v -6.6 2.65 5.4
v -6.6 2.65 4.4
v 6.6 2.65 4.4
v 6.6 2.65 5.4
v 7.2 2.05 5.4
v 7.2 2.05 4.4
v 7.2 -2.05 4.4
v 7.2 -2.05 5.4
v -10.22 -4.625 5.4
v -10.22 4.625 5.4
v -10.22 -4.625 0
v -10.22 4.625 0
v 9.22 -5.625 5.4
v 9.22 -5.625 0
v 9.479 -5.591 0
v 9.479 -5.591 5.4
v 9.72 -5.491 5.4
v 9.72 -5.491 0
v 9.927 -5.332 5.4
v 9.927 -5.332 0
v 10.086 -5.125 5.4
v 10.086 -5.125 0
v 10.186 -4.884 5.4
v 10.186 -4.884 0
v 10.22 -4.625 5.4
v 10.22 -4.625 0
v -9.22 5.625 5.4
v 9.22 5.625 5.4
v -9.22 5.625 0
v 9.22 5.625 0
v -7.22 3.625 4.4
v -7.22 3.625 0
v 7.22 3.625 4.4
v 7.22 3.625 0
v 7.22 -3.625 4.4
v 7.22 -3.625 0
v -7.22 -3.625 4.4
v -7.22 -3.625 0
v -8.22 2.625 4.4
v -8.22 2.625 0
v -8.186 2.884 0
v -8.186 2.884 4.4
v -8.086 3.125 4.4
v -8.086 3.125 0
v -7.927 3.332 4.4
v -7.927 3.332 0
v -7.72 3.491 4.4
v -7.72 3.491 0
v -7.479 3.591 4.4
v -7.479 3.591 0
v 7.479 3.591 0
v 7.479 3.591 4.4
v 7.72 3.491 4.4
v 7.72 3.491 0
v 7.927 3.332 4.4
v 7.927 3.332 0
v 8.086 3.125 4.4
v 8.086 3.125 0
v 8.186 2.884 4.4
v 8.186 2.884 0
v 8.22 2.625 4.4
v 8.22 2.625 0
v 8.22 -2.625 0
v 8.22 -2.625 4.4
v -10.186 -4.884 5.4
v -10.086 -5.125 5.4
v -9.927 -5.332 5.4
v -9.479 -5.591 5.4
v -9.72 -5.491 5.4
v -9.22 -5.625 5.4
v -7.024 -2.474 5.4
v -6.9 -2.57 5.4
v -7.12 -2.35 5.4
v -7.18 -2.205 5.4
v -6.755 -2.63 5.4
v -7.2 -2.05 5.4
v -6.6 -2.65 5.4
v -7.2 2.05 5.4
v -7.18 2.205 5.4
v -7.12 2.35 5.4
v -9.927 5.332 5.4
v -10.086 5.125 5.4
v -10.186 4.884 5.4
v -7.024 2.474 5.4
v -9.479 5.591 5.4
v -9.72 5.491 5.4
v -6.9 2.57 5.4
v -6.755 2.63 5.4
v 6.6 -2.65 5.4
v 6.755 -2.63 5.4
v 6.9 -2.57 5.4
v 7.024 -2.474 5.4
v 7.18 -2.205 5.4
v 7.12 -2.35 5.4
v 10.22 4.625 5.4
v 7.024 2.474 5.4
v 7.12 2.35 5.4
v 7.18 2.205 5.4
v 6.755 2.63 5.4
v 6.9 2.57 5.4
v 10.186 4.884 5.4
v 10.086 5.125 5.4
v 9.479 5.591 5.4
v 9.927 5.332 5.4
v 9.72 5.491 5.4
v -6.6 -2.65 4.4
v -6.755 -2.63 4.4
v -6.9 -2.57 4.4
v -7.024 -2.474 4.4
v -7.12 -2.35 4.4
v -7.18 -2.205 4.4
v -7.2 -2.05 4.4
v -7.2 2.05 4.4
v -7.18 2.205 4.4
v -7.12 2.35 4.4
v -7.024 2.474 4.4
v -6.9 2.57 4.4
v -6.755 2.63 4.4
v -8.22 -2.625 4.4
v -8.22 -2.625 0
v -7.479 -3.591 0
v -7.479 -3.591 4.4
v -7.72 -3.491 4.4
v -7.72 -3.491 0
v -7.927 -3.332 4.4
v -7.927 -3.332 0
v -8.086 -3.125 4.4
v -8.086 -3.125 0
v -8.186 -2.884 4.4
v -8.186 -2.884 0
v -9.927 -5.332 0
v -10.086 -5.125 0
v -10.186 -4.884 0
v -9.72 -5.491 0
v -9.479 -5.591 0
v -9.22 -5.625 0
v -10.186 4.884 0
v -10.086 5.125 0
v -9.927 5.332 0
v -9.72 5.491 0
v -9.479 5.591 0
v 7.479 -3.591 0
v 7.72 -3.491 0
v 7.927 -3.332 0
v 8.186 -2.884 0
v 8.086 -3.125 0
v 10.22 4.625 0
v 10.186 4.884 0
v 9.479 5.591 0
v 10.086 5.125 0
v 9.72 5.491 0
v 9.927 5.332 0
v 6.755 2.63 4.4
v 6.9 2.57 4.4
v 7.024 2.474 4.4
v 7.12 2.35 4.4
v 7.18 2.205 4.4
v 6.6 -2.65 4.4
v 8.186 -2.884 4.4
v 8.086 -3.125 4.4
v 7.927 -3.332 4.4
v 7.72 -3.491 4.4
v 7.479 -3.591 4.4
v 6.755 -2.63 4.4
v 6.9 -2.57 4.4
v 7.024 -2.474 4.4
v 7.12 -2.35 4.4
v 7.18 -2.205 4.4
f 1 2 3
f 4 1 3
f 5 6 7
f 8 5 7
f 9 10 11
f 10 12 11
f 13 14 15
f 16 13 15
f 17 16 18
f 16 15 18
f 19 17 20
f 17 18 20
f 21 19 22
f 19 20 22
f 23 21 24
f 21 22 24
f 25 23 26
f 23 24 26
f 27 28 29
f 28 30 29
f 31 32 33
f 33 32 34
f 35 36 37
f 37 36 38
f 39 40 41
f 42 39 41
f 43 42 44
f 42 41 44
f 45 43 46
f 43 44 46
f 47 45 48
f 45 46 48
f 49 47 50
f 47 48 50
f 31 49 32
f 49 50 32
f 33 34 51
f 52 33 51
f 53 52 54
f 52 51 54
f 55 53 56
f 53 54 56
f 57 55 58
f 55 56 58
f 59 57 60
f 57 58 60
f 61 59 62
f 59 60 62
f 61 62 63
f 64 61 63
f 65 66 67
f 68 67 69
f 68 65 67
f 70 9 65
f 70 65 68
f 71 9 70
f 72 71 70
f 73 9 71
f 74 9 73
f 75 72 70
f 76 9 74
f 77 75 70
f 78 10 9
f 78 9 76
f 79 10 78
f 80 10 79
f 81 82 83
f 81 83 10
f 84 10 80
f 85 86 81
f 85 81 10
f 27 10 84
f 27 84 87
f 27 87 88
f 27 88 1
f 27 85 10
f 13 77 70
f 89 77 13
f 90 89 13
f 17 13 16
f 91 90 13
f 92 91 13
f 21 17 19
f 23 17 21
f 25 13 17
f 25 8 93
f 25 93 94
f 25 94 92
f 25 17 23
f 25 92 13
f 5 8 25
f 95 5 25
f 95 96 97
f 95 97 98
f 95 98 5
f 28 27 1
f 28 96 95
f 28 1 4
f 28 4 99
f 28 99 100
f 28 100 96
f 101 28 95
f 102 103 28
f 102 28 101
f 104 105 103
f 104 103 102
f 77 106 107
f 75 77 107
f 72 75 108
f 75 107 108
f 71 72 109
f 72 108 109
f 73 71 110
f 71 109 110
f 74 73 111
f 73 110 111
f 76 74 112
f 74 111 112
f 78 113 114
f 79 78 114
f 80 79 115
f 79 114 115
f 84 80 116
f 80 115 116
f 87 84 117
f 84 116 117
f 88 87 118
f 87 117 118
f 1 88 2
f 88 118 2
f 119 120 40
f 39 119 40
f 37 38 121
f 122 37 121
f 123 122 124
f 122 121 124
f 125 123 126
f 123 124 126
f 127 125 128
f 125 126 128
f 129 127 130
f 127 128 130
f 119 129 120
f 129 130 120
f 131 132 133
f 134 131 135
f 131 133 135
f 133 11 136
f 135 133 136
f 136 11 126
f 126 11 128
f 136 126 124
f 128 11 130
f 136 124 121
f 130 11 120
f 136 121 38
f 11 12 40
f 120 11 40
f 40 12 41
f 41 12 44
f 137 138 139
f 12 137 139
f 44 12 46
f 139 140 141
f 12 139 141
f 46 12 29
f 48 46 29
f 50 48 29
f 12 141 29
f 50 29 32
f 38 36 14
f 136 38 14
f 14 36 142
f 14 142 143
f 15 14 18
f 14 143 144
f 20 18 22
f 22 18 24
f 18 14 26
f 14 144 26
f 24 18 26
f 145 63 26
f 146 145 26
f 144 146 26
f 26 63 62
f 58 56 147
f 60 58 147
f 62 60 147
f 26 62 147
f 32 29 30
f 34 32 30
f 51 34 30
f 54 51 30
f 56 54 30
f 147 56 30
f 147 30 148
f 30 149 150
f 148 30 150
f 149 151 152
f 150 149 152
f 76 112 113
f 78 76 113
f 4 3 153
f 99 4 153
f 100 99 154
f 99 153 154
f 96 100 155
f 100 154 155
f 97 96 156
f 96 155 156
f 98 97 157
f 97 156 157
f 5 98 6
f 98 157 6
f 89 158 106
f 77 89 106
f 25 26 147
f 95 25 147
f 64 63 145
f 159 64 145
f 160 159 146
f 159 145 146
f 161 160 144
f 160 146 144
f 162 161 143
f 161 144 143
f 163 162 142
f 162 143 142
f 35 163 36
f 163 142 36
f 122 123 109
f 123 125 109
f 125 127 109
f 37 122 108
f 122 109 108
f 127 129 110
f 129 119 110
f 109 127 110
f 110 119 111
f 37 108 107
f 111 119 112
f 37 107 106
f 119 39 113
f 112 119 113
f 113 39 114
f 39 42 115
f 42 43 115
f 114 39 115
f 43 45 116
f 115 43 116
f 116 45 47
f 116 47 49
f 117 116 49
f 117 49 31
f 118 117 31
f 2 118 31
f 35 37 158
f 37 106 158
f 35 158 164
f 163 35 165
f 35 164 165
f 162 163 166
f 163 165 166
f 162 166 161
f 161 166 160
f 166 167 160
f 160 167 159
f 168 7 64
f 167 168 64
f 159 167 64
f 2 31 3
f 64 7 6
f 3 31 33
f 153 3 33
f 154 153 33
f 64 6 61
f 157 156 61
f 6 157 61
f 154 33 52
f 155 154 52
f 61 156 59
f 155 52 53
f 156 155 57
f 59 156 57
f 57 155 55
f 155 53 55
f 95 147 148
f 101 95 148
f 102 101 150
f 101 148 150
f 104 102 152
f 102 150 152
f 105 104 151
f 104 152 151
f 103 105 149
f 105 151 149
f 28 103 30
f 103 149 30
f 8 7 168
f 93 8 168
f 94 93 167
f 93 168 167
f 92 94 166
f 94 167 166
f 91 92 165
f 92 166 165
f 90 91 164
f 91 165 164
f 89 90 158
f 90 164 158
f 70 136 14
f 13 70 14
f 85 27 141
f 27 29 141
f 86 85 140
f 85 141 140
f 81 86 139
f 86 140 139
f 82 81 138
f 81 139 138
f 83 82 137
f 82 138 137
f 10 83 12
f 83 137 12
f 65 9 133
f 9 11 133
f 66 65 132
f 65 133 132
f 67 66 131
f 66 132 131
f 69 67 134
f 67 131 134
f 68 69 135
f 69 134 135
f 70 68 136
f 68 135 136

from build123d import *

# Parameters (mm, degrees)
F1_DEPTH = 4.4
F3_DEPTH = 1
F4_DEPTH = 1


with BuildPart() as f1:
    # F0 (on Top) → F1 (new body)
    with BuildSketch(Plane.XY):
        with BuildLine():
            ThreePointArc((10.22, 4.625), (9.9271067812, 5.3321067812), (9.22, 5.625))
            Line((9.22, 5.625), (-9.22, 5.625))
            ThreePointArc((-9.22, 5.625), (-9.9271067812, 5.3321067812), (-10.22, 4.625))
            Line((-10.22, 4.625), (-10.22, -4.625))
            ThreePointArc((-10.22, -4.625), (-9.9271067812, -5.3321067812), (-9.22, -5.625))
            Line((-9.22, -5.625), (9.22, -5.625))
            ThreePointArc((9.22, -5.625), (9.9271067812, -5.3321067812), (10.22, -4.625))
            Line((10.22, -4.625), (10.22, 4.625))
        make_face()
        with BuildLine():
            Line((-7.22, 3.625), (7.22, 3.625))
            ThreePointArc((7.22, 3.625), (7.9271067812, 3.3321067812), (8.22, 2.625))
            Line((8.22, 2.625), (8.22, -2.625))
            ThreePointArc((8.22, -2.625), (7.9271067812, -3.3321067812), (7.22, -3.625))
            Line((7.22, -3.625), (-7.22, -3.625))
            ThreePointArc((-7.22, -3.625), (-7.9271067812, -3.3321067812), (-8.22, -2.625))
            Line((-8.22, -2.625), (-8.22, 2.625))
            ThreePointArc((-8.22, 2.625), (-7.9271067812, 3.3321067812), (-7.22, 3.625))
        make_face(mode=Mode.SUBTRACT)
    extrude(amount=F1_DEPTH)

    # F2 (on face) → F3 (join)
    with BuildSketch(Plane.XY.offset(4.4)):
        with BuildLine():
            Line((7.22, 3.625), (-7.22, 3.625))
            ThreePointArc((-7.22, 3.625), (-7.9271067812, 3.3321067812), (-8.22, 2.625))
            Line((-8.22, 2.625), (-8.22, -2.625))
            ThreePointArc((-8.22, -2.625), (-7.9271067812, -3.3321067812), (-7.22, -3.625))
            Line((-7.22, -3.625), (7.22, -3.625))
            ThreePointArc((7.22, -3.625), (7.9271067812, -3.3321067812), (8.22, -2.625))
            Line((8.22, -2.625), (8.22, 2.625))
            ThreePointArc((8.22, 2.625), (7.9271067812, 3.3321067812), (7.22, 3.625))
        make_face()
        with BuildLine():
            ThreePointArc((7.2, -2.05), (7.0242640687, -2.4742640687), (6.6, -2.65))
            Line((6.6, -2.65), (-6.6, -2.65))
            ThreePointArc((-6.6, -2.65), (-7.0242640687, -2.4742640687), (-7.2, -2.05))
            Line((-7.2, -2.05), (-7.2, 2.05))
            ThreePointArc((-7.2, 2.05), (-7.0242640687, 2.4742640687), (-6.6, 2.65))
            Line((-6.6, 2.65), (6.6, 2.65))
            ThreePointArc((6.6, 2.65), (7.0242640687, 2.4742640687), (7.2, 2.05))
            Line((7.2, 2.05), (7.2, -2.05))
        make_face(mode=Mode.SUBTRACT)
    extrude(amount=F3_DEPTH)

    # F4 (add): a face of the model
    f4_faces = [f1.faces().sort_by_distance(p)[0] for p in [
        (9.9866855984, 0, 4.4),
    ]]
    extrude(f4_faces, amount=F4_DEPTH)


solid = f1.part
